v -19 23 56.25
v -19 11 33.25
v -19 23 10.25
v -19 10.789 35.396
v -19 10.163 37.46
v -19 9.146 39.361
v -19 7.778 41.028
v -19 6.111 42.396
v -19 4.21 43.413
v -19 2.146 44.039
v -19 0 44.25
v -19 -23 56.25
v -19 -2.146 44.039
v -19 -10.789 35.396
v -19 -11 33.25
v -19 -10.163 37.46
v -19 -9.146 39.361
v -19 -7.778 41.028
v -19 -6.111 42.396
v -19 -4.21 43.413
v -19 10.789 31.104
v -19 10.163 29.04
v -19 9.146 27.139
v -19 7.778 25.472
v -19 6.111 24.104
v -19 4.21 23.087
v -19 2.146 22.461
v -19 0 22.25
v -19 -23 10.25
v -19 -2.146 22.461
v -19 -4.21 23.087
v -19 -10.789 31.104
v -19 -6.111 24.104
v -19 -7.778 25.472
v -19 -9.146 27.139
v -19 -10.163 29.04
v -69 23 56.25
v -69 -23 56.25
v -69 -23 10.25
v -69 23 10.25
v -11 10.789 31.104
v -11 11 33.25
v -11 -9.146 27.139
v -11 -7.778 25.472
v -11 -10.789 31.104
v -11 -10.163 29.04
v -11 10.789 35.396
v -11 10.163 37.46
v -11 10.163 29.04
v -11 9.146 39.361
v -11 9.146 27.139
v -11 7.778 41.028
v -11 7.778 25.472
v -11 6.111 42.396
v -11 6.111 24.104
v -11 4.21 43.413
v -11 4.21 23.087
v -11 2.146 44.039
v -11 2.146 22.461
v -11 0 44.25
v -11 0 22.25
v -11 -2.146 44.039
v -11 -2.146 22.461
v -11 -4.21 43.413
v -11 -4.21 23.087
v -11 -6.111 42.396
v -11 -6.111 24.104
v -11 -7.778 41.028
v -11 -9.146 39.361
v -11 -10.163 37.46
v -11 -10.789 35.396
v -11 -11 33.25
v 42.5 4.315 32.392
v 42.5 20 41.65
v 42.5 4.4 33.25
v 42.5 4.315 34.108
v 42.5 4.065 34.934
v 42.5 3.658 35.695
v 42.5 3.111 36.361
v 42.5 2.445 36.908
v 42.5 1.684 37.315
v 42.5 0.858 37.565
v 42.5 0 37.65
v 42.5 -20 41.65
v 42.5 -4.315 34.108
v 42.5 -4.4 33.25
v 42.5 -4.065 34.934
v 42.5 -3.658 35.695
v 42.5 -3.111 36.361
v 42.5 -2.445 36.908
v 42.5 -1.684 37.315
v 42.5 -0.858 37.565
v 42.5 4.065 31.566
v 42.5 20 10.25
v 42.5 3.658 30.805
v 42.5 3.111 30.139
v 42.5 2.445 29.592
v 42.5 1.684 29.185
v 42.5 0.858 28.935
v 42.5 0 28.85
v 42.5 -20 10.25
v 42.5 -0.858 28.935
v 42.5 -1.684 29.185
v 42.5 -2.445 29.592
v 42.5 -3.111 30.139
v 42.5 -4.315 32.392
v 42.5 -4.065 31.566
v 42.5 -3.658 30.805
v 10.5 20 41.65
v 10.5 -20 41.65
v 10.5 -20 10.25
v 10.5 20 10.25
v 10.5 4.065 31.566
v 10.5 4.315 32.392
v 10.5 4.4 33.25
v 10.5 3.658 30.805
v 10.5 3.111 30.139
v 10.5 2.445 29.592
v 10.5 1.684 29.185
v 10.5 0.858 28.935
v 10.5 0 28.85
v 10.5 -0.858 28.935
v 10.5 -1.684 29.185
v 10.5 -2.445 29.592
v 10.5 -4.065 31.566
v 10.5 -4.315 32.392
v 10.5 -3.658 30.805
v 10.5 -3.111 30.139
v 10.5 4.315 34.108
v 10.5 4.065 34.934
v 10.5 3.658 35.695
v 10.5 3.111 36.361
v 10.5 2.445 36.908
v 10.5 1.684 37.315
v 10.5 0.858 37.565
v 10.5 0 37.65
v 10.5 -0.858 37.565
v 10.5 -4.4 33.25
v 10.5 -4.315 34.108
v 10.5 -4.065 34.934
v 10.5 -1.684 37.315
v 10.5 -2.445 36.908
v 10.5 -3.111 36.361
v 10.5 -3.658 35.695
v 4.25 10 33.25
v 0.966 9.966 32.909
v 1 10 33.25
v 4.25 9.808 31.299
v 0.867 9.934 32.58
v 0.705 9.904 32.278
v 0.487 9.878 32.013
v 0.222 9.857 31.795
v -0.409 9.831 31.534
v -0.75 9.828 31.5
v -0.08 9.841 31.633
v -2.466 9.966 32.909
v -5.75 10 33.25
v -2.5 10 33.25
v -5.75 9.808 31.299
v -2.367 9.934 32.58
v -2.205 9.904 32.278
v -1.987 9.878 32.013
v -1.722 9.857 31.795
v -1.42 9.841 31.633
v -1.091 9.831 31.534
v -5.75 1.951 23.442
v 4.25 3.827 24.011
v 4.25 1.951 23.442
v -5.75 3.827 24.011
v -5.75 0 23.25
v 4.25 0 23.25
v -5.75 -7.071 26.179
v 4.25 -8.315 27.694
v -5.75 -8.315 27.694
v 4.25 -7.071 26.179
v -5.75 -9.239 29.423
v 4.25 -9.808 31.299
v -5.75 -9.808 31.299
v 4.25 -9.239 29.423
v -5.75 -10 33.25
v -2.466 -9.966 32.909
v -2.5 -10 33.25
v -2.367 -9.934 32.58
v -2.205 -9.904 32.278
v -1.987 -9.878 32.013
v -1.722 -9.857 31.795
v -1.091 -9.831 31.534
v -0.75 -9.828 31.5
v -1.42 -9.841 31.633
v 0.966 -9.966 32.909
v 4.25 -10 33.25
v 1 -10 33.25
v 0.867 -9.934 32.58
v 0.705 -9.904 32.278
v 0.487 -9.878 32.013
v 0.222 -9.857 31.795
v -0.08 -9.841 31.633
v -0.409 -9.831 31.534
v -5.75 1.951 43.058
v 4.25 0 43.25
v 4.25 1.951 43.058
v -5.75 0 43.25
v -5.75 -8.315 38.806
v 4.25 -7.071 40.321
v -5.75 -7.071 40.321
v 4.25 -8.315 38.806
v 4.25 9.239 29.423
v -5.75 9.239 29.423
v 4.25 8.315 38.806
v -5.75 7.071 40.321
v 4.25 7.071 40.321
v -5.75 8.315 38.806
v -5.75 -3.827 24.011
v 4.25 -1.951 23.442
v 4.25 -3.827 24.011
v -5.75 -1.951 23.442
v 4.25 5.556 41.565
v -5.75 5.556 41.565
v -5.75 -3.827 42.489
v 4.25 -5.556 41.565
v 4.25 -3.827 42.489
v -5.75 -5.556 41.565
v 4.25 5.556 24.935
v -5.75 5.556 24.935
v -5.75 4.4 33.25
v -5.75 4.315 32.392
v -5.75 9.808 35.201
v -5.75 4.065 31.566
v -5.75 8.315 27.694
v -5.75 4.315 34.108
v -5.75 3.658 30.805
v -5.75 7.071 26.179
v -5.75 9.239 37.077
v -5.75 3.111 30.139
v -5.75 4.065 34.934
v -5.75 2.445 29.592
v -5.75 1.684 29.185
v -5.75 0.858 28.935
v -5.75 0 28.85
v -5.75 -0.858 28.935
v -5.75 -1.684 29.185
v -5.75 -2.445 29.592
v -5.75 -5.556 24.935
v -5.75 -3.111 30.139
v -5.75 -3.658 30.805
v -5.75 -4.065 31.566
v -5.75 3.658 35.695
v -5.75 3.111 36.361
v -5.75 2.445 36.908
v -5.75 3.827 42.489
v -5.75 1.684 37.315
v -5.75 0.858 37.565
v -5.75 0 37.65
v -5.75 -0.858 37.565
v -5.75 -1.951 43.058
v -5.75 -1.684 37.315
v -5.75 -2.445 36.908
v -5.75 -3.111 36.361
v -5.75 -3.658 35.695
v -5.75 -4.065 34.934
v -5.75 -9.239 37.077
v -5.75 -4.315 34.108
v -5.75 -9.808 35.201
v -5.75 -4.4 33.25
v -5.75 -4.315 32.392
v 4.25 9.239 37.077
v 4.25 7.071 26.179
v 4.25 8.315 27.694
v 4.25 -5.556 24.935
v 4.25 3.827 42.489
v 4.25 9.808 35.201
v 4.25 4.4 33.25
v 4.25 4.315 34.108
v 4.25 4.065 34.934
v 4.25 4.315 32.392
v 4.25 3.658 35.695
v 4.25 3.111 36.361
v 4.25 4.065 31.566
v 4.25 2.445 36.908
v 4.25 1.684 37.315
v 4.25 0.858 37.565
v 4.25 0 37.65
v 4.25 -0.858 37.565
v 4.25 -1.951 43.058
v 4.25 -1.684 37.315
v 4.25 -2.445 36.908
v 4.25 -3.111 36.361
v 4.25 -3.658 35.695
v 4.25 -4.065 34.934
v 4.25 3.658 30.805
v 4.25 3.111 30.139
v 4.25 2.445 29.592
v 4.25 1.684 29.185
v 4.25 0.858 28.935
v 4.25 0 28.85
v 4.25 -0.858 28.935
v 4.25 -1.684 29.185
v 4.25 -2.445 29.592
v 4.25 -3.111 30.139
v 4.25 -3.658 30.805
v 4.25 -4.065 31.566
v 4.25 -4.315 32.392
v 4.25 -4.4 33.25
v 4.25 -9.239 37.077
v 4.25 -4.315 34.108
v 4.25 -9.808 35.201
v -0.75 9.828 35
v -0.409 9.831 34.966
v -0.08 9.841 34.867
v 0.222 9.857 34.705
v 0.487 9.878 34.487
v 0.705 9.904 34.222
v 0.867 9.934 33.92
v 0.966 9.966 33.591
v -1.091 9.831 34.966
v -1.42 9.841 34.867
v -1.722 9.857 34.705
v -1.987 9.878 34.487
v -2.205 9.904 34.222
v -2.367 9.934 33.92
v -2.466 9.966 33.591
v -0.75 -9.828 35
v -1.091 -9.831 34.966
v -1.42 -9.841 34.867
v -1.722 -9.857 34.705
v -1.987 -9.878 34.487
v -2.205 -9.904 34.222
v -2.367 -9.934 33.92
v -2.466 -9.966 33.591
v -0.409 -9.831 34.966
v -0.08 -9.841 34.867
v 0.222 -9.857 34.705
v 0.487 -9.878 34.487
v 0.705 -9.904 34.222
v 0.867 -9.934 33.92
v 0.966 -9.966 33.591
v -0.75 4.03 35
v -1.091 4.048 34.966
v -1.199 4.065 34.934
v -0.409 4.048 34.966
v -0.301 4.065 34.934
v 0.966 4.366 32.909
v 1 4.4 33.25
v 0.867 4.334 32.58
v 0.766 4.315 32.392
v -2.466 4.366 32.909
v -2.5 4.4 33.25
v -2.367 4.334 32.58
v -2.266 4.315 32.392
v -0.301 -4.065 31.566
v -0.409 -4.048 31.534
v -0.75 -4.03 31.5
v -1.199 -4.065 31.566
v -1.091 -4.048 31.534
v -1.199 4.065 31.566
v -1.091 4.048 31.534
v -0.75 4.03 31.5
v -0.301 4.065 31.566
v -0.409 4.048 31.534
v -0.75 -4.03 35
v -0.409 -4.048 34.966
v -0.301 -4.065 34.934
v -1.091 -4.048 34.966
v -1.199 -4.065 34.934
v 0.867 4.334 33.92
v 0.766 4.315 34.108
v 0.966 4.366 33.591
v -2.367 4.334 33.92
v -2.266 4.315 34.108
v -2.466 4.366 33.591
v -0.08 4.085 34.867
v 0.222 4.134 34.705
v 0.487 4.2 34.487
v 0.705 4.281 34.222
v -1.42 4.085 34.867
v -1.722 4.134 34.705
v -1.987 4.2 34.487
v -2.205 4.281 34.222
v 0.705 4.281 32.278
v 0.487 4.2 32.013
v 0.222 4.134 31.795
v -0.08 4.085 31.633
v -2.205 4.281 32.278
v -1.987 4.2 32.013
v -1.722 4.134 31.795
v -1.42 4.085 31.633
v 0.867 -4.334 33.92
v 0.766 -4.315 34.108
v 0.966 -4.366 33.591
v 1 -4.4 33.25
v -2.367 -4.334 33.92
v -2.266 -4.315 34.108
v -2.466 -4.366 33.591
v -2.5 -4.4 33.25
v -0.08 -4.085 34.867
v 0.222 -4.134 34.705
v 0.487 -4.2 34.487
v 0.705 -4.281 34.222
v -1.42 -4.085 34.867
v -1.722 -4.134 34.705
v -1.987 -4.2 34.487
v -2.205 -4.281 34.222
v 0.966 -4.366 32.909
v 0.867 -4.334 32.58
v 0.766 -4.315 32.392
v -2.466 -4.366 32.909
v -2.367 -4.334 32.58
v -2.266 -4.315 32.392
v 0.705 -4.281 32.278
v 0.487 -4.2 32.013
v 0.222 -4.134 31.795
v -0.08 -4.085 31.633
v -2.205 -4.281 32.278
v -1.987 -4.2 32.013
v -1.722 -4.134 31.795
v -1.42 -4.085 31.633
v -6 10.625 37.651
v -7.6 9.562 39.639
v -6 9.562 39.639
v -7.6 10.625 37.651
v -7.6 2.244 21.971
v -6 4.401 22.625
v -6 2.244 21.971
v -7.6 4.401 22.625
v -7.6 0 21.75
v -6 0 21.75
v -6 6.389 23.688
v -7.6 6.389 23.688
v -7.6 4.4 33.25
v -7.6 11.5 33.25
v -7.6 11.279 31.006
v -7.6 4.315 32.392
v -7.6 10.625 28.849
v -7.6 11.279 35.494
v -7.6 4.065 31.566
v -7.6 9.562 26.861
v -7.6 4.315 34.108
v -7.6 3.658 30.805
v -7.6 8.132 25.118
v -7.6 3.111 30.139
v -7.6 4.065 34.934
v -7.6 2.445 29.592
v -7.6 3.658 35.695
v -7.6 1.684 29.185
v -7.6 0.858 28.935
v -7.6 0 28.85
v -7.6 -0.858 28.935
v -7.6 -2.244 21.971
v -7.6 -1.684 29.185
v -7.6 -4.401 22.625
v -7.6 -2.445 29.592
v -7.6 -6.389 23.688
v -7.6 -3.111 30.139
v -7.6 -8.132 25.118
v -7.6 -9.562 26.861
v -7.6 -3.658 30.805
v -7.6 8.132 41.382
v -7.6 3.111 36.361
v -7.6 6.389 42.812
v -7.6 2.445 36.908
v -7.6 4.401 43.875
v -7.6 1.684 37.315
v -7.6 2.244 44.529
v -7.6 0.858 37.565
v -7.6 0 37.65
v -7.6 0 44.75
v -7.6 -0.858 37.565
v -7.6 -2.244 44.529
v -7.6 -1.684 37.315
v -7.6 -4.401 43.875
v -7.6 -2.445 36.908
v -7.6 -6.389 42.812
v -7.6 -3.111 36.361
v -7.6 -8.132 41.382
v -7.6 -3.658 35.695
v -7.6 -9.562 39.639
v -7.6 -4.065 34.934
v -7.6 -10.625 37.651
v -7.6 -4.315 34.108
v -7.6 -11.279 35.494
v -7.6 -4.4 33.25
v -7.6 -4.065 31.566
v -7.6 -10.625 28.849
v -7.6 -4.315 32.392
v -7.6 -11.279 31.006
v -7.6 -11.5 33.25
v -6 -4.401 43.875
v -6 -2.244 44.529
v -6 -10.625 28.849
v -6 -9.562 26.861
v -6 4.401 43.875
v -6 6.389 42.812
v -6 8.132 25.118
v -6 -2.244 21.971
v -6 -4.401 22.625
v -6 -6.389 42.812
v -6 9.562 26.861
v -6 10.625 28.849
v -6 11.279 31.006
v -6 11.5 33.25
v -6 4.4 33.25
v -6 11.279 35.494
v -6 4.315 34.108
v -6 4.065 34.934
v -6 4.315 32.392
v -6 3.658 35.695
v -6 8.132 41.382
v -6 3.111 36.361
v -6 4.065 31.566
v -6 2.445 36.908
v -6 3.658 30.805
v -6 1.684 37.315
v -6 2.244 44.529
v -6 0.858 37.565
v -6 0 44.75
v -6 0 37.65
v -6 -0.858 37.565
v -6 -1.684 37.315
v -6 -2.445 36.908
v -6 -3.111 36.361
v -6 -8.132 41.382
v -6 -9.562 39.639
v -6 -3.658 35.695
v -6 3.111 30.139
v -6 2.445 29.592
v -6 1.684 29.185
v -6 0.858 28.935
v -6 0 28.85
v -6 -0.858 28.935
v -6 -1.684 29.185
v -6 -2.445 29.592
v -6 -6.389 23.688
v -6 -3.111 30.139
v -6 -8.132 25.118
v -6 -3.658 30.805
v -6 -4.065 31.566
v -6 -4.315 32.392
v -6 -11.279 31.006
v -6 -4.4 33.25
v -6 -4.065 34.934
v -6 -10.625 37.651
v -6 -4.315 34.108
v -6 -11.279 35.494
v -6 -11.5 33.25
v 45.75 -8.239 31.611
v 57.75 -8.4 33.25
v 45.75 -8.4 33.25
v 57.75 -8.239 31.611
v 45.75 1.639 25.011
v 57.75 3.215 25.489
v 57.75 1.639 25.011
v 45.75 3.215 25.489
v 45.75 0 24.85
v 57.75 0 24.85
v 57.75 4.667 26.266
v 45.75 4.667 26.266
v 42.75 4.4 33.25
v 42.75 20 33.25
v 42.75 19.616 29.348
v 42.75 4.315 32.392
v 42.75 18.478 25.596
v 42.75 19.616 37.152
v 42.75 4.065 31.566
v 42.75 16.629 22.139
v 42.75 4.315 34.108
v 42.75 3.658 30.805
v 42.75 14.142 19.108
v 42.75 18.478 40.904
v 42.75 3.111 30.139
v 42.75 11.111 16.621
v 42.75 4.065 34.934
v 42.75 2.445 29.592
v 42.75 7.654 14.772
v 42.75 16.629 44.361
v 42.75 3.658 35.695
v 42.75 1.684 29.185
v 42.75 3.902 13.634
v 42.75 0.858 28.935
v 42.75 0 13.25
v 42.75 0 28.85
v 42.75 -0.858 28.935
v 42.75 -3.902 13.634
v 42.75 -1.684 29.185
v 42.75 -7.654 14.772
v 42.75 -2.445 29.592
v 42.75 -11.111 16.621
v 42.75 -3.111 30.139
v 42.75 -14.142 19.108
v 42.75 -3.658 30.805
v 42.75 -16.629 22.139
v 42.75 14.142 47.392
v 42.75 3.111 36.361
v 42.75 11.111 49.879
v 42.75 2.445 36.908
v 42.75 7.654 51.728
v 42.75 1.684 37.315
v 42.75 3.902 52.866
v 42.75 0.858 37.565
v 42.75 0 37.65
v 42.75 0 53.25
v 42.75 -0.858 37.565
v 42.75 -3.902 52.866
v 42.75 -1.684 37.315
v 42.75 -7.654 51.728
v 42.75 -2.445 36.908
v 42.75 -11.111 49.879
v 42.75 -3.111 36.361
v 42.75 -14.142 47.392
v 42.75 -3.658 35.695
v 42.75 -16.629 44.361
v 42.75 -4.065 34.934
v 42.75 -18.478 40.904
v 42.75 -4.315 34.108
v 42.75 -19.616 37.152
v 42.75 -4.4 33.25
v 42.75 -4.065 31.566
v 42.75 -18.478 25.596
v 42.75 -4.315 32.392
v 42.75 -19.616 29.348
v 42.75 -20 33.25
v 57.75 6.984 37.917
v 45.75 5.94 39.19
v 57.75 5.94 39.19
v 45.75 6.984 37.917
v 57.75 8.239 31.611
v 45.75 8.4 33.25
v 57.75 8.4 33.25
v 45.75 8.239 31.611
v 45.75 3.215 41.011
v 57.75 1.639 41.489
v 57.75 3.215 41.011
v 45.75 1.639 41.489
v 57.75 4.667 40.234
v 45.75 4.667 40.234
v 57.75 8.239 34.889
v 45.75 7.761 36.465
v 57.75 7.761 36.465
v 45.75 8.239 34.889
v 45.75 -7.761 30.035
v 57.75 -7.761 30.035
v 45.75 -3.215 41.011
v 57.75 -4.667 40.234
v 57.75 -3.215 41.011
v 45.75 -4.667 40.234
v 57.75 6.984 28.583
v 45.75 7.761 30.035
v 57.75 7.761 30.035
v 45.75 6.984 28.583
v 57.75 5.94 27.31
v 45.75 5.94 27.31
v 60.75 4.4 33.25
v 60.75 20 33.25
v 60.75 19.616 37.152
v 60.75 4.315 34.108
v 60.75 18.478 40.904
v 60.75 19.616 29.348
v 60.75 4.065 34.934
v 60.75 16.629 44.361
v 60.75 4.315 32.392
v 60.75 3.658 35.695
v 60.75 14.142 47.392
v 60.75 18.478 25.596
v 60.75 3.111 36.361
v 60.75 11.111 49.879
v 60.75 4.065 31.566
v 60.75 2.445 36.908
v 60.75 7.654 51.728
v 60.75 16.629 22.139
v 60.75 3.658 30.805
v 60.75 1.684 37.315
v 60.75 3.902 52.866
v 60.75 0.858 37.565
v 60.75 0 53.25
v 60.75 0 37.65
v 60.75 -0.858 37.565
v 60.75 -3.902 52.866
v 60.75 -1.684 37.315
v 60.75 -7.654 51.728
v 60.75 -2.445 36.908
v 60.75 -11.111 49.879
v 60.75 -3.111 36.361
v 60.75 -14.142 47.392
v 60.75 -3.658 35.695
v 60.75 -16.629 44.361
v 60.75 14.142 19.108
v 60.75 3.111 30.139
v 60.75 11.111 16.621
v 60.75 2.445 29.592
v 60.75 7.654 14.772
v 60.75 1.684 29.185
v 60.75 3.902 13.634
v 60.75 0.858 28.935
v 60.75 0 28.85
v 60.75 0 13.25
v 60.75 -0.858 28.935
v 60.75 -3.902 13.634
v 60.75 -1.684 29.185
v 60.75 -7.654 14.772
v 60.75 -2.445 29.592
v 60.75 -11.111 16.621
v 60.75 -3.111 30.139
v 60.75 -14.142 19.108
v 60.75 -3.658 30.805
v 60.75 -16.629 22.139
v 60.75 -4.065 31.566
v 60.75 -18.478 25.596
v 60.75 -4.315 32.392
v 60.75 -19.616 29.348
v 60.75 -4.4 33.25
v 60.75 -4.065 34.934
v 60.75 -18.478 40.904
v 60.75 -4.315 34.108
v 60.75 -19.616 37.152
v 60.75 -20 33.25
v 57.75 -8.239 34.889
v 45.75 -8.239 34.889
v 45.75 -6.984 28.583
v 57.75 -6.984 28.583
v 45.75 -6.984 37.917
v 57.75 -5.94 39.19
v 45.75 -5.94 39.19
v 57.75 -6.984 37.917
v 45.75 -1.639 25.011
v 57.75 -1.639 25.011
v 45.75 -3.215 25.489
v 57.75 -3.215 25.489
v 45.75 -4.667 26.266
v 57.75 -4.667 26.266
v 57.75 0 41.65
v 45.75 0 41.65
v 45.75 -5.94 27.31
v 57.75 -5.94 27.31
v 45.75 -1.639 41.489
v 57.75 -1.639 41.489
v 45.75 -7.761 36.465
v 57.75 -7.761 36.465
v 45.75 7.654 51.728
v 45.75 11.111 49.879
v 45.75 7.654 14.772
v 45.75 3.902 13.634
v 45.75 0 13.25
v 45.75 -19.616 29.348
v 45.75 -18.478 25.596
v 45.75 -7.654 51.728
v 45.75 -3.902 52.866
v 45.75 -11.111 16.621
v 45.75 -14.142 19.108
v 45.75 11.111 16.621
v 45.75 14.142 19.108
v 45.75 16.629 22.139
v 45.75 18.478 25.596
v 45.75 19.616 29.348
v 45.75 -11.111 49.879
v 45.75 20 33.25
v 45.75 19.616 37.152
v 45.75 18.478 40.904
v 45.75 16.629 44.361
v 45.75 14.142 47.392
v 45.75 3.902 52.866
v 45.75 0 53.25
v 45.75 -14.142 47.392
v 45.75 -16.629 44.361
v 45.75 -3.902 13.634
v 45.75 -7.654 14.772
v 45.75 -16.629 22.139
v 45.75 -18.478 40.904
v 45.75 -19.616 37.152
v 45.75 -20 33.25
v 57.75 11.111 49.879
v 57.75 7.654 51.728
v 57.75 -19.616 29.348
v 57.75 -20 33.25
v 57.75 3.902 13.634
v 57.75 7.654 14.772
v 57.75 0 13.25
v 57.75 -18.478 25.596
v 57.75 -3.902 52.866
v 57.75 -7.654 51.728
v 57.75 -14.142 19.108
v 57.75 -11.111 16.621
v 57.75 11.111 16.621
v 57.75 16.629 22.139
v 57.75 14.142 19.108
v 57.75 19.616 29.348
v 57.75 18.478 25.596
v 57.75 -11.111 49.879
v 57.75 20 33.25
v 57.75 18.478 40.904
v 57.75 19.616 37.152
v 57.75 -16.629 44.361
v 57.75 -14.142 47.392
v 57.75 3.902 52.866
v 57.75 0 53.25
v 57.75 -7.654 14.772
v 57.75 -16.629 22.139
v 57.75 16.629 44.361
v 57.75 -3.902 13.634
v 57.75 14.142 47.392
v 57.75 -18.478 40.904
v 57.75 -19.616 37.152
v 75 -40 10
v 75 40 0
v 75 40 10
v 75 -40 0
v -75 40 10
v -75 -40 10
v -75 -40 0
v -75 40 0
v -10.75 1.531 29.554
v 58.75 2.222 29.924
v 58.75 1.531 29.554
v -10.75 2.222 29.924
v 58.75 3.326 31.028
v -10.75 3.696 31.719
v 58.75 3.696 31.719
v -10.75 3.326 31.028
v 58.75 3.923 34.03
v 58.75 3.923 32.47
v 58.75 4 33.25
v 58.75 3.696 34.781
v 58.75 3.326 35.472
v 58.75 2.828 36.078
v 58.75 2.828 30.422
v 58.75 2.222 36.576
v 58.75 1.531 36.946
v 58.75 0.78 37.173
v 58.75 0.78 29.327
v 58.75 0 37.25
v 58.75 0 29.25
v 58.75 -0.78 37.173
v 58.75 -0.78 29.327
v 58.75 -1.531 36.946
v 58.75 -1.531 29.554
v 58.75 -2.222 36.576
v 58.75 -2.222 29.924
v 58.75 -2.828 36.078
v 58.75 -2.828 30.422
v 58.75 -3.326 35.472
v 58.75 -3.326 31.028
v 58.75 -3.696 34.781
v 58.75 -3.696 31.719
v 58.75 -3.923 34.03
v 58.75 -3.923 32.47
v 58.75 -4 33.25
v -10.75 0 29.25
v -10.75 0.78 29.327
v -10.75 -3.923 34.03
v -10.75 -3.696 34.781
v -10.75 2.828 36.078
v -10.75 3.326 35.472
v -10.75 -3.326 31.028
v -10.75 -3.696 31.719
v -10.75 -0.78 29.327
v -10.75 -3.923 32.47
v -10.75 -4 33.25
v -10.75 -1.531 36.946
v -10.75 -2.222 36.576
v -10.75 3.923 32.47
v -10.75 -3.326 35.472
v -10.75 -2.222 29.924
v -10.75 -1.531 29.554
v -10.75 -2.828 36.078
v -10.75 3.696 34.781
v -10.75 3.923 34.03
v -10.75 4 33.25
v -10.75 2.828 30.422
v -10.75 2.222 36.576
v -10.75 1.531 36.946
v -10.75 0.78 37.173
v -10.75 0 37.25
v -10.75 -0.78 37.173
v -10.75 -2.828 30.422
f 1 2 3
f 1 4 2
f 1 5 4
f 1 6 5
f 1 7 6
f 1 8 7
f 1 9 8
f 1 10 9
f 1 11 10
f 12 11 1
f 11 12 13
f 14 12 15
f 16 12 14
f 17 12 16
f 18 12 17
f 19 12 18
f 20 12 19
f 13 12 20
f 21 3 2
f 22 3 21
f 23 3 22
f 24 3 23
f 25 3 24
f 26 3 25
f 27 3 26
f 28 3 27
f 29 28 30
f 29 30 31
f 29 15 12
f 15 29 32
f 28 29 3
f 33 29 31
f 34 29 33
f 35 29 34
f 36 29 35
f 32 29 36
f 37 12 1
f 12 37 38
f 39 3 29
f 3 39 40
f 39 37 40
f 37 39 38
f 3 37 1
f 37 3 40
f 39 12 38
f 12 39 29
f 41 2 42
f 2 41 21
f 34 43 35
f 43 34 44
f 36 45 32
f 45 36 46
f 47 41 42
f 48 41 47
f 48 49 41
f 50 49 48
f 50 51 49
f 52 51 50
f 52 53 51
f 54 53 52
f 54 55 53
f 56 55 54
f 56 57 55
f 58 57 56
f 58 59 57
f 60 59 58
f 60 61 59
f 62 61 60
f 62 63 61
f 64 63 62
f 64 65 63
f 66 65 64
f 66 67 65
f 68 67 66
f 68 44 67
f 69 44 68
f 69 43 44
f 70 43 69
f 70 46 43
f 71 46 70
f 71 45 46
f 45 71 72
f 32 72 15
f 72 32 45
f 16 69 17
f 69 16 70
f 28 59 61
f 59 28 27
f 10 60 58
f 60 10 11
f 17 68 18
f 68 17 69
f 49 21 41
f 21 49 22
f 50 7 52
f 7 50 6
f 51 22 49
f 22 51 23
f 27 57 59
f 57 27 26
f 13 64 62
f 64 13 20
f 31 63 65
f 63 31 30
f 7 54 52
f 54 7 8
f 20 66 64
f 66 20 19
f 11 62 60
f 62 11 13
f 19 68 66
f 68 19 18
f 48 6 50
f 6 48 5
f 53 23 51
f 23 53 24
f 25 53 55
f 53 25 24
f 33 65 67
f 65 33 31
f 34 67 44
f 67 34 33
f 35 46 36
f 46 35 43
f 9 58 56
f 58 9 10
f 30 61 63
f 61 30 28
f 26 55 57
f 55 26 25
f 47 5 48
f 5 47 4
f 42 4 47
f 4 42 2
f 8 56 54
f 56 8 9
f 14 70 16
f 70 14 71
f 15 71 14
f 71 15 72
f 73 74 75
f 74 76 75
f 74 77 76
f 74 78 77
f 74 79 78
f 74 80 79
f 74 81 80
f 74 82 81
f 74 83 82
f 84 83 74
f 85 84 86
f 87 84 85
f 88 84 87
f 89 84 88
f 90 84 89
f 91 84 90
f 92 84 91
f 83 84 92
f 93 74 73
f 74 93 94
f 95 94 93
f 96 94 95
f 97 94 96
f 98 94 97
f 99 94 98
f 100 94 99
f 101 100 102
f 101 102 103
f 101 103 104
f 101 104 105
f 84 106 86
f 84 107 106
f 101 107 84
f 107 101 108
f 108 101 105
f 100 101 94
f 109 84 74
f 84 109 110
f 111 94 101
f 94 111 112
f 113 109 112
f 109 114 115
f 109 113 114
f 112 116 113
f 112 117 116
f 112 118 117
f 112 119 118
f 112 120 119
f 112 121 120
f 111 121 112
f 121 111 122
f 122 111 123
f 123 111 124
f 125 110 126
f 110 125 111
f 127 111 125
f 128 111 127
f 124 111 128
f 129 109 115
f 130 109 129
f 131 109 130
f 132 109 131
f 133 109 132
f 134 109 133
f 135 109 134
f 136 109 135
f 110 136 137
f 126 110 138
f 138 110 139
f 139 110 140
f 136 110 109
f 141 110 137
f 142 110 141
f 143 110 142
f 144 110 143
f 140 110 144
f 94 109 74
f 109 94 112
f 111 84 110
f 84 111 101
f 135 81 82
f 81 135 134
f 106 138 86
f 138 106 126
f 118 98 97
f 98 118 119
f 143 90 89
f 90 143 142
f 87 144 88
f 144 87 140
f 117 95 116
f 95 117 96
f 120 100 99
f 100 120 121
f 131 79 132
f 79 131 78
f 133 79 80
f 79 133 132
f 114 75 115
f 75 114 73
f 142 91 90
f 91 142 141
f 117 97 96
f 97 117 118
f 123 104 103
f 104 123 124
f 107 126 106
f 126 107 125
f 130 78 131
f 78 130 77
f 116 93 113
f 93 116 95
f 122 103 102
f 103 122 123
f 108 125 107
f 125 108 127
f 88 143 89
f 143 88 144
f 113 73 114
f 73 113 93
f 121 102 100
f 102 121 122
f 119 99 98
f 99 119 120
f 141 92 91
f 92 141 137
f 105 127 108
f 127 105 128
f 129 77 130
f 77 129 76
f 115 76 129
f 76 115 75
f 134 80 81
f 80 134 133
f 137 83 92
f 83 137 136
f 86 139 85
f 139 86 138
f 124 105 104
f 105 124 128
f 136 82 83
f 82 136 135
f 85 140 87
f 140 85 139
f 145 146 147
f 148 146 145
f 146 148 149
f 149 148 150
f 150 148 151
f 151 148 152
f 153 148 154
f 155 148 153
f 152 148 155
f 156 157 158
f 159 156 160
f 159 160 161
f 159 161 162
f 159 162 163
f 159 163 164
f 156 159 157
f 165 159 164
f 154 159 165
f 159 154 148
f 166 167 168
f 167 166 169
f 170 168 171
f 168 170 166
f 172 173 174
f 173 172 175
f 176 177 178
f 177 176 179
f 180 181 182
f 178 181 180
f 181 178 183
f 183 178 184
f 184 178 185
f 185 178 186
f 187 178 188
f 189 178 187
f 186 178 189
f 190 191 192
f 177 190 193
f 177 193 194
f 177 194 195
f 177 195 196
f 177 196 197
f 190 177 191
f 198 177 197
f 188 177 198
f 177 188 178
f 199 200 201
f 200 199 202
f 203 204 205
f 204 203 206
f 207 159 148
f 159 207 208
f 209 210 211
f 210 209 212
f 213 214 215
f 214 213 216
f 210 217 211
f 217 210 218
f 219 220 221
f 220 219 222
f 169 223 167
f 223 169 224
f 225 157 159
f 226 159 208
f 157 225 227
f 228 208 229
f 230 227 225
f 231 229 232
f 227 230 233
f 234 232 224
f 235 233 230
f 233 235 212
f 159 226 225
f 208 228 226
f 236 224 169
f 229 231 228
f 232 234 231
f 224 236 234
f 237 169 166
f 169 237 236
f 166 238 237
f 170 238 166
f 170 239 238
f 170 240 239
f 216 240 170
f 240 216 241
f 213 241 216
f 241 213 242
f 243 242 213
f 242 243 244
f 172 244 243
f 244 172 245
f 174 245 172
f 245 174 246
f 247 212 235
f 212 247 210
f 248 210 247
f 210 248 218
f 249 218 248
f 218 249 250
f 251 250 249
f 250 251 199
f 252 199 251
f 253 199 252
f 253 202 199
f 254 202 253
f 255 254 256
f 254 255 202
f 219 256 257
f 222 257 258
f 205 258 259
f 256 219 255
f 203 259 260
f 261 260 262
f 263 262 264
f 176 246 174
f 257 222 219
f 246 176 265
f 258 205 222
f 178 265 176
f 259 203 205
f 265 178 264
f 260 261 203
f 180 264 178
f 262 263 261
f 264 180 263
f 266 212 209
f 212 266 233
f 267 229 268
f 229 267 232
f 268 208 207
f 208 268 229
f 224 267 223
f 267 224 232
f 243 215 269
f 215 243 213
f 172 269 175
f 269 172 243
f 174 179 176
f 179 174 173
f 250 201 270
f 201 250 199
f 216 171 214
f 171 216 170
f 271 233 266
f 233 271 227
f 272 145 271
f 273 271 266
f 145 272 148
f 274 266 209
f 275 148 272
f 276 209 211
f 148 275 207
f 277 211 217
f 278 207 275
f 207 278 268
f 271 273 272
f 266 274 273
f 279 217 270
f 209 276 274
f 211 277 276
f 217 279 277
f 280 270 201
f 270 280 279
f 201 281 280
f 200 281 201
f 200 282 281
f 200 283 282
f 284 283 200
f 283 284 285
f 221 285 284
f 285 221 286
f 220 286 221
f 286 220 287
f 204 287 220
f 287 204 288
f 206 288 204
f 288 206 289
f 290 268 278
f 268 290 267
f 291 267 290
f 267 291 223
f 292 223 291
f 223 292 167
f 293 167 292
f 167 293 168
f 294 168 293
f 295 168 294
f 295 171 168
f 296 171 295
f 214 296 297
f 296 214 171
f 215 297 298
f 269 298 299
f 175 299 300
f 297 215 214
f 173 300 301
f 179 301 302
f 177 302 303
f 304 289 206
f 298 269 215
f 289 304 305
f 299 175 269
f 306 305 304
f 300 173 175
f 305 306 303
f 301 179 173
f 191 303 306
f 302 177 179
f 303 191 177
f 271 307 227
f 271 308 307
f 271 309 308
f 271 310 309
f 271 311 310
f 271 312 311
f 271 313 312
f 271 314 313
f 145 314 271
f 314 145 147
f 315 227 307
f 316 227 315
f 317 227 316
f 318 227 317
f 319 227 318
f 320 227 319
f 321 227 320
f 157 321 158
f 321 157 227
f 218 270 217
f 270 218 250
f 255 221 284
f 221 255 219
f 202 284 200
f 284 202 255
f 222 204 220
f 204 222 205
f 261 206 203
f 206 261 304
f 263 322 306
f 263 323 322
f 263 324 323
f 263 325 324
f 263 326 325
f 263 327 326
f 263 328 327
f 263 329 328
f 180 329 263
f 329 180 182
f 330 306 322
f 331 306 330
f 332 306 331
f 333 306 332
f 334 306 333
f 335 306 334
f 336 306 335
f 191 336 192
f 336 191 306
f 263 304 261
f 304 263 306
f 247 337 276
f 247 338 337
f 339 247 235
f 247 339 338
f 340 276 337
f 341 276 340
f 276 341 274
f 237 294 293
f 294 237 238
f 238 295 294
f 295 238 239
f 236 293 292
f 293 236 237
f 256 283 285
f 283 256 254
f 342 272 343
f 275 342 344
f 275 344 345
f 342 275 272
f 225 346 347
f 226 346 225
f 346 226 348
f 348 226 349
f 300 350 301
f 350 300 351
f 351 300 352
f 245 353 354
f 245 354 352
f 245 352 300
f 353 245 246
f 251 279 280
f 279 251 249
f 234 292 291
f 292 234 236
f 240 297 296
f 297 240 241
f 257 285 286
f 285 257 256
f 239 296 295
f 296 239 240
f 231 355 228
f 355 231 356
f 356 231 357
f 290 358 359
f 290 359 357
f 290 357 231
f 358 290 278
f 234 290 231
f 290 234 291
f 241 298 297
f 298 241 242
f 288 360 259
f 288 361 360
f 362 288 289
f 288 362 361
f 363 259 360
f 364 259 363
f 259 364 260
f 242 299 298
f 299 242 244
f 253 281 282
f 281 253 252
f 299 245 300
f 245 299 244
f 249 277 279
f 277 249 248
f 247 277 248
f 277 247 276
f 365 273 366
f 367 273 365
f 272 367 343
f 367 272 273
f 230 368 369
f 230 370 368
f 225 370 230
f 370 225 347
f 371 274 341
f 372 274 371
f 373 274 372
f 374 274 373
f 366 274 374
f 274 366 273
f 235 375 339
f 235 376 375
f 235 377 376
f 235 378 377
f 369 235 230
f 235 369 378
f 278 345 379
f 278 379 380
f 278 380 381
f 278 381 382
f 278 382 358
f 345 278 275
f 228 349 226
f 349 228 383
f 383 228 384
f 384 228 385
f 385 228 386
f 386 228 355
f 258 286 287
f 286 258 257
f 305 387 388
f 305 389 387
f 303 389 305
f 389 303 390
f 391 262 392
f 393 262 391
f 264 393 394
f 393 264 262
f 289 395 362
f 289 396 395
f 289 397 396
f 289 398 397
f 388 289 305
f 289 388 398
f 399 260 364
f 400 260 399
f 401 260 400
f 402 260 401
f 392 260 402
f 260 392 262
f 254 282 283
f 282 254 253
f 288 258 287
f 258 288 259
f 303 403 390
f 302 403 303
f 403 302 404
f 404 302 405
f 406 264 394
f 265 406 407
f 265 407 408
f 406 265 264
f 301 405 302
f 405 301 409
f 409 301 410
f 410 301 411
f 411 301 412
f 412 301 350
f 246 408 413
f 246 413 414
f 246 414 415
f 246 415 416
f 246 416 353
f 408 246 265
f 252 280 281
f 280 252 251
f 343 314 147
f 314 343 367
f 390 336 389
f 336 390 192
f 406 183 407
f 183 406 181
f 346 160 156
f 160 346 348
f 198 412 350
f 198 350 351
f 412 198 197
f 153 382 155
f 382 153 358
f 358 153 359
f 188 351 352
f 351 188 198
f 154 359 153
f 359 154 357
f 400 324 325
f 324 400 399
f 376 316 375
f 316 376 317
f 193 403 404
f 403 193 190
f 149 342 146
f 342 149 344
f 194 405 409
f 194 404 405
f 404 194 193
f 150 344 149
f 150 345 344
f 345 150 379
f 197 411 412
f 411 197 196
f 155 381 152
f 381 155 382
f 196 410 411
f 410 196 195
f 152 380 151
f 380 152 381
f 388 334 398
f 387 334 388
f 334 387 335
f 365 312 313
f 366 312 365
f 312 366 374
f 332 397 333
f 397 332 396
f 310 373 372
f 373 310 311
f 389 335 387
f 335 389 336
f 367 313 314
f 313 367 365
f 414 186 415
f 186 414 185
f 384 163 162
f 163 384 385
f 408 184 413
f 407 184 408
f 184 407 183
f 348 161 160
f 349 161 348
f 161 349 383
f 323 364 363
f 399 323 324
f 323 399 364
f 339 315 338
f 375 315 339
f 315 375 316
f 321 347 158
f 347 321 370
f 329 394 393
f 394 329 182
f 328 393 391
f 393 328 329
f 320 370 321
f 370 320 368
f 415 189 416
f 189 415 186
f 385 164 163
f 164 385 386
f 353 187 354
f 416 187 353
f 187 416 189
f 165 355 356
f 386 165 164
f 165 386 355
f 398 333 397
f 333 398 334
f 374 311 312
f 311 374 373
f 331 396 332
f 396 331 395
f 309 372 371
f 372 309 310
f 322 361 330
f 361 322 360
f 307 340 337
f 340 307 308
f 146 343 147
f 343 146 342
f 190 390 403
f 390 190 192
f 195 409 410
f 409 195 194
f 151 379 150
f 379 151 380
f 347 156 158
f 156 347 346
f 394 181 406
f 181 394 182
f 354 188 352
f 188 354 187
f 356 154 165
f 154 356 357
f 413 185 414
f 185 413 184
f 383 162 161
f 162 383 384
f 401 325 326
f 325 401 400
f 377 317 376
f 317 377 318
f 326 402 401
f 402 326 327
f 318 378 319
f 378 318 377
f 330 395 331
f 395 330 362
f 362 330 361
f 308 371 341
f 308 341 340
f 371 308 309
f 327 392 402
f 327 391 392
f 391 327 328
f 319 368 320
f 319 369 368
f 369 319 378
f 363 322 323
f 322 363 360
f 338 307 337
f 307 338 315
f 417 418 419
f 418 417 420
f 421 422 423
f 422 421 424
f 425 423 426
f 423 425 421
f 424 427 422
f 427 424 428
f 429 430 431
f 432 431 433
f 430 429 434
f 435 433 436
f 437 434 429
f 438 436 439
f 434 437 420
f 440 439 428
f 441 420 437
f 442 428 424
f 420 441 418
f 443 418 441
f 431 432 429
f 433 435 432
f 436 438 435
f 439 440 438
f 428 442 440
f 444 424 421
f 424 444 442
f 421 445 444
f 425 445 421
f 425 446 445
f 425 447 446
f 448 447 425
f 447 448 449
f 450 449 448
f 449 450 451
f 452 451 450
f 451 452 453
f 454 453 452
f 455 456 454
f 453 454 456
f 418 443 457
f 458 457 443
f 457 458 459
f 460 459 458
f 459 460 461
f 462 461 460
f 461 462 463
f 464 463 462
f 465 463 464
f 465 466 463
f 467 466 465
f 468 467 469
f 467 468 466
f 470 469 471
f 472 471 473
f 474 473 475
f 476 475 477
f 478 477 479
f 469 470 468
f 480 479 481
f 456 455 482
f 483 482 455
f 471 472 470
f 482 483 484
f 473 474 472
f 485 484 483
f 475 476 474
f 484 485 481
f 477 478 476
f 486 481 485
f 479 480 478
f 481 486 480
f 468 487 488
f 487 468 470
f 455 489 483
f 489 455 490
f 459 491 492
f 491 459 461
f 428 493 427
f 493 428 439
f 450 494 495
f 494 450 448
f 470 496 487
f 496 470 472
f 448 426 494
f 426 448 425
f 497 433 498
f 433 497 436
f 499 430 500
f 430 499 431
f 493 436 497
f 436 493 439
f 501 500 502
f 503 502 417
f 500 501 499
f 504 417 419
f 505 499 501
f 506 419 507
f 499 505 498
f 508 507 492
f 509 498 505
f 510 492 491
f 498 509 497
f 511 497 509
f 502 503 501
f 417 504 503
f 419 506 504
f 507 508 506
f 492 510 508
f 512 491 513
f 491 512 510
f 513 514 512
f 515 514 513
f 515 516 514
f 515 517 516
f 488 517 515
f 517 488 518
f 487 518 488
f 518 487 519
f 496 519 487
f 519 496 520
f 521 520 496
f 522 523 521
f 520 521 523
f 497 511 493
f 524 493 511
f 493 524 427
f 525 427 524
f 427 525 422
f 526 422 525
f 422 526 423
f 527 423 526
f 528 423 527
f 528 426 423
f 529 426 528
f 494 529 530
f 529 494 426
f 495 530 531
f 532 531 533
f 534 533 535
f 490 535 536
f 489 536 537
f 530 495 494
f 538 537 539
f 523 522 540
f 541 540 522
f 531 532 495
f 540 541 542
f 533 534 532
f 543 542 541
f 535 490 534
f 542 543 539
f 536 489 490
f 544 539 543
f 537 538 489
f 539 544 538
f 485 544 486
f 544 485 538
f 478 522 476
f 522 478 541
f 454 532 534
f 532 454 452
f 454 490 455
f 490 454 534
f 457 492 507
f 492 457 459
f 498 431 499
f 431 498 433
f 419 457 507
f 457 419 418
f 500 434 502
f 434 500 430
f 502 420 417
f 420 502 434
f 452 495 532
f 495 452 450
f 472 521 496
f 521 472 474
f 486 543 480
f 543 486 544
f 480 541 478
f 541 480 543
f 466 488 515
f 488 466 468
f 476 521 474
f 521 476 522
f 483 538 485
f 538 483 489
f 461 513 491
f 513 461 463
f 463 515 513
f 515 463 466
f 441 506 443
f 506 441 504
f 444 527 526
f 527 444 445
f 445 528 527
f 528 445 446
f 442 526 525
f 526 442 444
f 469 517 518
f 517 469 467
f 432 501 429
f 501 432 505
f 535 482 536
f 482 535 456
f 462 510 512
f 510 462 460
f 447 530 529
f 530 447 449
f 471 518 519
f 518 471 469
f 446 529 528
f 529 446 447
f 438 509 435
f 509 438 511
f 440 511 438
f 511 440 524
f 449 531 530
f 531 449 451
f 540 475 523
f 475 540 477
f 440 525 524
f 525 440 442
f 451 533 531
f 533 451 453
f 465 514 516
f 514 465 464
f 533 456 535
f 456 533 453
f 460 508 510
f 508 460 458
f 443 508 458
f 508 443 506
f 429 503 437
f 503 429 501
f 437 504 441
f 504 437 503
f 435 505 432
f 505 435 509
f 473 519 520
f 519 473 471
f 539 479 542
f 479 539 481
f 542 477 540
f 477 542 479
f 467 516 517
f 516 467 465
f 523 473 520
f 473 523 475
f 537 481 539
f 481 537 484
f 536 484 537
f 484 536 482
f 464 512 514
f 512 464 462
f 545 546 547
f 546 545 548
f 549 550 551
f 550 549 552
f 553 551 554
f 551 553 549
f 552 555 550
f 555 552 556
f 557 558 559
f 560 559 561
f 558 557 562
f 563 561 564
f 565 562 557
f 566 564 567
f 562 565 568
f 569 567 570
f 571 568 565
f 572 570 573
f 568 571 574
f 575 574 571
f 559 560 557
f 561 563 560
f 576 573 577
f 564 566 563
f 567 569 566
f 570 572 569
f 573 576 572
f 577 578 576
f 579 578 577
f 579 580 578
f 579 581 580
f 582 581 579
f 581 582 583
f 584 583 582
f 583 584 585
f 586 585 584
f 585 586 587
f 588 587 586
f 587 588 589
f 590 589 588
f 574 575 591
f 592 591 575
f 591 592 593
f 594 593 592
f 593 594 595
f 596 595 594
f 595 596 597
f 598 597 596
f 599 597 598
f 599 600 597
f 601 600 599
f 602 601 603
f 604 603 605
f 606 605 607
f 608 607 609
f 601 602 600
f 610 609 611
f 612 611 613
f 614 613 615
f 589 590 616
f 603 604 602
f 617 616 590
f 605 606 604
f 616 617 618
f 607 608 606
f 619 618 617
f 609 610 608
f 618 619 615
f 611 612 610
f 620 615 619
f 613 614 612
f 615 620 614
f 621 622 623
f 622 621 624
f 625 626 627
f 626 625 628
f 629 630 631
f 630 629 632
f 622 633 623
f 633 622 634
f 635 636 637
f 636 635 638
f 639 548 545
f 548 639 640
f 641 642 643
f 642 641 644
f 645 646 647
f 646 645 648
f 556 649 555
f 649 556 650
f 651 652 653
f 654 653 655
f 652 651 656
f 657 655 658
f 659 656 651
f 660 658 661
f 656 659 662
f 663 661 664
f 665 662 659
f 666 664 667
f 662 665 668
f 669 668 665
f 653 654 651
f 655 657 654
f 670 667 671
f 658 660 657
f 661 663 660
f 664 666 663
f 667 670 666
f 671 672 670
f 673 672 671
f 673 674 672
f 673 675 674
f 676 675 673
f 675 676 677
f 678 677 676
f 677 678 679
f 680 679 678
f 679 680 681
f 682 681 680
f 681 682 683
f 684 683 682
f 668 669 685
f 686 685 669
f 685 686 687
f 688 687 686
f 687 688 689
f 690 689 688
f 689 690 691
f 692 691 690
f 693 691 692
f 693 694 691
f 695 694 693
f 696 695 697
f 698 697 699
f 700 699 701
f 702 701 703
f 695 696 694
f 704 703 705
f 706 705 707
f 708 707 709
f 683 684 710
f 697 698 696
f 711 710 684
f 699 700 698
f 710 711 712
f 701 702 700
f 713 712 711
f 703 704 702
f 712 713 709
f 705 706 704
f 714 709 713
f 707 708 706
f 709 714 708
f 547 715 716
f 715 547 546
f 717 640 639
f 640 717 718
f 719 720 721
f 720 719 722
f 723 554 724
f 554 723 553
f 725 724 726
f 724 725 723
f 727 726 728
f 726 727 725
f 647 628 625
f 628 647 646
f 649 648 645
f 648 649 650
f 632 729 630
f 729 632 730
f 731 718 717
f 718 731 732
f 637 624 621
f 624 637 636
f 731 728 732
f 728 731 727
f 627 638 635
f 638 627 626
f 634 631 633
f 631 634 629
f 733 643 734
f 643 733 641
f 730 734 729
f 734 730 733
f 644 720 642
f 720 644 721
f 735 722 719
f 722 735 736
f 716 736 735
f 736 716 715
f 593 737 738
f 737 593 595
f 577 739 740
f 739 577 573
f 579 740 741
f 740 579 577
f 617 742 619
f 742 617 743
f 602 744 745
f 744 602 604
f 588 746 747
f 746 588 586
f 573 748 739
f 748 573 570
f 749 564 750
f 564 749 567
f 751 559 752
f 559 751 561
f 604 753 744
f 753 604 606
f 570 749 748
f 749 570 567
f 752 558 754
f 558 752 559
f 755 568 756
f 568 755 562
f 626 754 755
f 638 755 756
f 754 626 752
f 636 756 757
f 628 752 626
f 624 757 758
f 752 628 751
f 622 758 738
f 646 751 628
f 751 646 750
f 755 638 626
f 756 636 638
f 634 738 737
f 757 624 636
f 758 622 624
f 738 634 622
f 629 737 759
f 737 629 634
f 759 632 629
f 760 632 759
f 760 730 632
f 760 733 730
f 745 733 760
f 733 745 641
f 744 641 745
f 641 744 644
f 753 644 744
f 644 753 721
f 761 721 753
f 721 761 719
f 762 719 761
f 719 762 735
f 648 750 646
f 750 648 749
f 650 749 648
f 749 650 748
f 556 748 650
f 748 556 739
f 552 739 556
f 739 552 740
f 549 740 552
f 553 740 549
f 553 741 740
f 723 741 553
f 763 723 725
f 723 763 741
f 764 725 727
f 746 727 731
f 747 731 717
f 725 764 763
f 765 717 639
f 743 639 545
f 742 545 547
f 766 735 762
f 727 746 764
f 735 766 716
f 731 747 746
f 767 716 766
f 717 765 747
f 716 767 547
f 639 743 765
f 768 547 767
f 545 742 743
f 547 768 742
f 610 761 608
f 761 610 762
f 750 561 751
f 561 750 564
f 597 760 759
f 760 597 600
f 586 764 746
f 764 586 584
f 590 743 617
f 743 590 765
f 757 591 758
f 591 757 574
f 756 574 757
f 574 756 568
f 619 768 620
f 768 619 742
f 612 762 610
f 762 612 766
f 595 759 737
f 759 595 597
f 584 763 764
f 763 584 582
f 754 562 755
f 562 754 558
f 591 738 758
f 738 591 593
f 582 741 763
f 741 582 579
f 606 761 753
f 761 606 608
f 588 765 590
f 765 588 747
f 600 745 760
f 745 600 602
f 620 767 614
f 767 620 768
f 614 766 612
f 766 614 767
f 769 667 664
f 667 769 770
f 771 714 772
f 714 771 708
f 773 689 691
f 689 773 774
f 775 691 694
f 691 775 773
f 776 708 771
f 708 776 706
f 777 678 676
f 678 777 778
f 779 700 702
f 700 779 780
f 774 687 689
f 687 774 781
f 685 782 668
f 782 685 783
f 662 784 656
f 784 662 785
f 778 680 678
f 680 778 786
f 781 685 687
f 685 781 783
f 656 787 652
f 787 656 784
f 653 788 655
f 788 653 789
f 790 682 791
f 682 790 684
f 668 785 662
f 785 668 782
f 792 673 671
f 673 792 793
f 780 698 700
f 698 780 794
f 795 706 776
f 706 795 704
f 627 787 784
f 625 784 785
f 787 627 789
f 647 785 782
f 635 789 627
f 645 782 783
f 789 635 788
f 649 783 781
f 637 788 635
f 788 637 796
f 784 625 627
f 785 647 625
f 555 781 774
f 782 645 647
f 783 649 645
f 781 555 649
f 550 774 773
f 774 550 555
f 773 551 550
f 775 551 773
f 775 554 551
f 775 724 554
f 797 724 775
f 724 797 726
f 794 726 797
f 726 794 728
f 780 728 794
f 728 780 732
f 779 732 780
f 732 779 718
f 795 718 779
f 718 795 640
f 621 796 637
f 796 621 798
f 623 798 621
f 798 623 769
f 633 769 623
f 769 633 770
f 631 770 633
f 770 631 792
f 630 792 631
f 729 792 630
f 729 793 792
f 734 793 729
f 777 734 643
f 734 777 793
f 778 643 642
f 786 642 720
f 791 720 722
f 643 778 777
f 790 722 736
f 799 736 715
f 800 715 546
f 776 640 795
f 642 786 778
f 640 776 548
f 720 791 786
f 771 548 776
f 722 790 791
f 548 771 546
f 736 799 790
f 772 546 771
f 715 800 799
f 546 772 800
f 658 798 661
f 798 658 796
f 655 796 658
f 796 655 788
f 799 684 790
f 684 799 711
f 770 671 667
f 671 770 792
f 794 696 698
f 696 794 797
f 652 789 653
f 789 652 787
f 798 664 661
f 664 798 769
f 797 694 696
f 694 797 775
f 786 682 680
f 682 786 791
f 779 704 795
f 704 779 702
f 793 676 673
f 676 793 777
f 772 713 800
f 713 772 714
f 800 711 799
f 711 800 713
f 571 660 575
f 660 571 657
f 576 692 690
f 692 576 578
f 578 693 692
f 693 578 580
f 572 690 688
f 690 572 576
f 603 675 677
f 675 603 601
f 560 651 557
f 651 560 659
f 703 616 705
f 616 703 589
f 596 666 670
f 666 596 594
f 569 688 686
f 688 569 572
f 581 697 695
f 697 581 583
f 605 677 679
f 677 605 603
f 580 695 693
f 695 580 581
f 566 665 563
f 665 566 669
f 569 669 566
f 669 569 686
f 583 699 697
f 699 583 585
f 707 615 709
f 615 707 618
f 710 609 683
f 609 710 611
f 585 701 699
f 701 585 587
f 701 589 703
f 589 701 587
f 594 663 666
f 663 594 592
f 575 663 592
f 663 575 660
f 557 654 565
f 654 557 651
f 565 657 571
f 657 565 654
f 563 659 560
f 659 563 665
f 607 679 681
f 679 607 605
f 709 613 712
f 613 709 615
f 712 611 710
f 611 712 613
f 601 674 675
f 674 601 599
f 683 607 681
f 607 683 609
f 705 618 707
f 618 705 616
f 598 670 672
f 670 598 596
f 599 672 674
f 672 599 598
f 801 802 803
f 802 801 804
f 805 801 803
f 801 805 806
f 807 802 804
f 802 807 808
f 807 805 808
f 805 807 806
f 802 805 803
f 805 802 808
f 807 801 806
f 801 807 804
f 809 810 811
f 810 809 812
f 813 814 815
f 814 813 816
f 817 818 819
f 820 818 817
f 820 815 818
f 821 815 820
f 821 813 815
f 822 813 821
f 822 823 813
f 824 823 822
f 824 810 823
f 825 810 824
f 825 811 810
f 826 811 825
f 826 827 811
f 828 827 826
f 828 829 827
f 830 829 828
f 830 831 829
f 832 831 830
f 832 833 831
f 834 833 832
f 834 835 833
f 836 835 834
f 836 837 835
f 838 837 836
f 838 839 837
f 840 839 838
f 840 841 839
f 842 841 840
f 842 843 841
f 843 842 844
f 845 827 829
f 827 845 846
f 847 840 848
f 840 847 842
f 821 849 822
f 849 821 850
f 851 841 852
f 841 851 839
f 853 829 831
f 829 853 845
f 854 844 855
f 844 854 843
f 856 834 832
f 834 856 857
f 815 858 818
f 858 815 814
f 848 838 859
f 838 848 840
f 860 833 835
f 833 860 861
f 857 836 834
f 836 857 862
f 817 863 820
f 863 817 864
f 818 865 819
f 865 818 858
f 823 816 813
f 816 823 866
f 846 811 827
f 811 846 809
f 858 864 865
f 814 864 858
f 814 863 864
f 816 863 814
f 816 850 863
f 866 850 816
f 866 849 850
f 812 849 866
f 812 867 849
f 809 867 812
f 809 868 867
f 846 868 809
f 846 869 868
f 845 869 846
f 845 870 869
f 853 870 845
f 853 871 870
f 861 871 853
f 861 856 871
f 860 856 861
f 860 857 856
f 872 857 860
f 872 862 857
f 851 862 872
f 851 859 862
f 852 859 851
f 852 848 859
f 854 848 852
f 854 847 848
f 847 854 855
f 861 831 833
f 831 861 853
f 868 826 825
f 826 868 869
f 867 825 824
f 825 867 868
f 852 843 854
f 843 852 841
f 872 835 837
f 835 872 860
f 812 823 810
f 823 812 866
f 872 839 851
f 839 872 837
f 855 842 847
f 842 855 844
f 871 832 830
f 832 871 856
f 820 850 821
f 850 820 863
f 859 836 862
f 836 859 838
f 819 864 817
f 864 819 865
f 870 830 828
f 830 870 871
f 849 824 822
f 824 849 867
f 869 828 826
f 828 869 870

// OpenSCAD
$fn = 32;

// ------------------------------------------------------------------------
// Motor drive station: motor 50 x 46 mm, shaft d8, pulley d40
// Every part is its own module, assembly() places every instance.
// ------------------------------------------------------------------------

// --- part 1 ---
module station_bed() {
  difference() {
    translate([-75, -40, 0]) cube([150, 80, 10]);
  }
}

// --- part 2 ---
module drive_motor() {
  union() {
    translate([-25, -23, 0]) cube([50, 46, 46]);
    translate([29, 0, 23]) rotate([0, 90, 0]) cylinder(h = 8, d = 22, center = true);
  }
}

// --- part 3 ---
module pillow_block() {
  difference() {
    translate([-16, -20, 0]) cube([32, 40, 31.4]);
    translate([0, 0, 23]) rotate([0, 90, 0]) cylinder(h = 34, d = 8.8, center = true);
  }
}

// --- part 4 ---
module drive_shaft() {
  translate([0, 0, -34.75]) cylinder(h = 69.5, d = 8);
}

// --- part 5 ---
module shaft_collar() {
  difference() {
    cylinder(h = 10, d = 20);
    translate([0, 0, -1]) cylinder(h = 12, d = 8.8);
    translate([0, 0, 5]) rotate([90, 0, 0]) cylinder(h = 22, d = 3.5, center = true);
  }
}

// --- part 6 ---
module collar_washer() {
  difference() {
      translate([0, 0, 0]) cylinder(h = 1.6, d = 23);
      translate([0, 0, -1]) cylinder(h = 3.6, d = 8.8);
    }
}

// --- part 7 ---
module drive_pulley() {
  difference() {
    union() {
      cylinder(h = 18, d = 16.8);
      cylinder(h = 3, d = 40);
      translate([0, 0, 15]) cylinder(h = 3, d = 40);
    }
    translate([0, 0, -1]) cylinder(h = 20, d = 8.8);
  }
}

// --- assembly ---
module assembly() {
  color([0.80, 0.24, 0.20]) translate([0, 0, 0]) rotate([0, 0, 0]) station_bed();
  color([0.20, 0.45, 0.75]) translate([-44, 0, 10.25]) rotate([0, 0, 0]) drive_motor();
  color([0.25, 0.62, 0.32]) translate([26.5, 0, 10.25]) rotate([0, 0, 0]) pillow_block();
  color([0.92, 0.70, 0.18]) translate([24, 0, 33.25]) rotate([0, 90, 0]) drive_shaft();
  color([0.58, 0.35, 0.70]) translate([-5.75, 0, 33.25]) rotate([0, 90, 0]) shaft_collar();
  color([0.16, 0.66, 0.66]) translate([-7.6, 0, 33.25]) rotate([0, 90, 0]) collar_washer();
  color([0.85, 0.48, 0.18]) translate([42.75, 0, 33.25]) rotate([0, 90, 0]) drive_pulley();
}

assembly();
